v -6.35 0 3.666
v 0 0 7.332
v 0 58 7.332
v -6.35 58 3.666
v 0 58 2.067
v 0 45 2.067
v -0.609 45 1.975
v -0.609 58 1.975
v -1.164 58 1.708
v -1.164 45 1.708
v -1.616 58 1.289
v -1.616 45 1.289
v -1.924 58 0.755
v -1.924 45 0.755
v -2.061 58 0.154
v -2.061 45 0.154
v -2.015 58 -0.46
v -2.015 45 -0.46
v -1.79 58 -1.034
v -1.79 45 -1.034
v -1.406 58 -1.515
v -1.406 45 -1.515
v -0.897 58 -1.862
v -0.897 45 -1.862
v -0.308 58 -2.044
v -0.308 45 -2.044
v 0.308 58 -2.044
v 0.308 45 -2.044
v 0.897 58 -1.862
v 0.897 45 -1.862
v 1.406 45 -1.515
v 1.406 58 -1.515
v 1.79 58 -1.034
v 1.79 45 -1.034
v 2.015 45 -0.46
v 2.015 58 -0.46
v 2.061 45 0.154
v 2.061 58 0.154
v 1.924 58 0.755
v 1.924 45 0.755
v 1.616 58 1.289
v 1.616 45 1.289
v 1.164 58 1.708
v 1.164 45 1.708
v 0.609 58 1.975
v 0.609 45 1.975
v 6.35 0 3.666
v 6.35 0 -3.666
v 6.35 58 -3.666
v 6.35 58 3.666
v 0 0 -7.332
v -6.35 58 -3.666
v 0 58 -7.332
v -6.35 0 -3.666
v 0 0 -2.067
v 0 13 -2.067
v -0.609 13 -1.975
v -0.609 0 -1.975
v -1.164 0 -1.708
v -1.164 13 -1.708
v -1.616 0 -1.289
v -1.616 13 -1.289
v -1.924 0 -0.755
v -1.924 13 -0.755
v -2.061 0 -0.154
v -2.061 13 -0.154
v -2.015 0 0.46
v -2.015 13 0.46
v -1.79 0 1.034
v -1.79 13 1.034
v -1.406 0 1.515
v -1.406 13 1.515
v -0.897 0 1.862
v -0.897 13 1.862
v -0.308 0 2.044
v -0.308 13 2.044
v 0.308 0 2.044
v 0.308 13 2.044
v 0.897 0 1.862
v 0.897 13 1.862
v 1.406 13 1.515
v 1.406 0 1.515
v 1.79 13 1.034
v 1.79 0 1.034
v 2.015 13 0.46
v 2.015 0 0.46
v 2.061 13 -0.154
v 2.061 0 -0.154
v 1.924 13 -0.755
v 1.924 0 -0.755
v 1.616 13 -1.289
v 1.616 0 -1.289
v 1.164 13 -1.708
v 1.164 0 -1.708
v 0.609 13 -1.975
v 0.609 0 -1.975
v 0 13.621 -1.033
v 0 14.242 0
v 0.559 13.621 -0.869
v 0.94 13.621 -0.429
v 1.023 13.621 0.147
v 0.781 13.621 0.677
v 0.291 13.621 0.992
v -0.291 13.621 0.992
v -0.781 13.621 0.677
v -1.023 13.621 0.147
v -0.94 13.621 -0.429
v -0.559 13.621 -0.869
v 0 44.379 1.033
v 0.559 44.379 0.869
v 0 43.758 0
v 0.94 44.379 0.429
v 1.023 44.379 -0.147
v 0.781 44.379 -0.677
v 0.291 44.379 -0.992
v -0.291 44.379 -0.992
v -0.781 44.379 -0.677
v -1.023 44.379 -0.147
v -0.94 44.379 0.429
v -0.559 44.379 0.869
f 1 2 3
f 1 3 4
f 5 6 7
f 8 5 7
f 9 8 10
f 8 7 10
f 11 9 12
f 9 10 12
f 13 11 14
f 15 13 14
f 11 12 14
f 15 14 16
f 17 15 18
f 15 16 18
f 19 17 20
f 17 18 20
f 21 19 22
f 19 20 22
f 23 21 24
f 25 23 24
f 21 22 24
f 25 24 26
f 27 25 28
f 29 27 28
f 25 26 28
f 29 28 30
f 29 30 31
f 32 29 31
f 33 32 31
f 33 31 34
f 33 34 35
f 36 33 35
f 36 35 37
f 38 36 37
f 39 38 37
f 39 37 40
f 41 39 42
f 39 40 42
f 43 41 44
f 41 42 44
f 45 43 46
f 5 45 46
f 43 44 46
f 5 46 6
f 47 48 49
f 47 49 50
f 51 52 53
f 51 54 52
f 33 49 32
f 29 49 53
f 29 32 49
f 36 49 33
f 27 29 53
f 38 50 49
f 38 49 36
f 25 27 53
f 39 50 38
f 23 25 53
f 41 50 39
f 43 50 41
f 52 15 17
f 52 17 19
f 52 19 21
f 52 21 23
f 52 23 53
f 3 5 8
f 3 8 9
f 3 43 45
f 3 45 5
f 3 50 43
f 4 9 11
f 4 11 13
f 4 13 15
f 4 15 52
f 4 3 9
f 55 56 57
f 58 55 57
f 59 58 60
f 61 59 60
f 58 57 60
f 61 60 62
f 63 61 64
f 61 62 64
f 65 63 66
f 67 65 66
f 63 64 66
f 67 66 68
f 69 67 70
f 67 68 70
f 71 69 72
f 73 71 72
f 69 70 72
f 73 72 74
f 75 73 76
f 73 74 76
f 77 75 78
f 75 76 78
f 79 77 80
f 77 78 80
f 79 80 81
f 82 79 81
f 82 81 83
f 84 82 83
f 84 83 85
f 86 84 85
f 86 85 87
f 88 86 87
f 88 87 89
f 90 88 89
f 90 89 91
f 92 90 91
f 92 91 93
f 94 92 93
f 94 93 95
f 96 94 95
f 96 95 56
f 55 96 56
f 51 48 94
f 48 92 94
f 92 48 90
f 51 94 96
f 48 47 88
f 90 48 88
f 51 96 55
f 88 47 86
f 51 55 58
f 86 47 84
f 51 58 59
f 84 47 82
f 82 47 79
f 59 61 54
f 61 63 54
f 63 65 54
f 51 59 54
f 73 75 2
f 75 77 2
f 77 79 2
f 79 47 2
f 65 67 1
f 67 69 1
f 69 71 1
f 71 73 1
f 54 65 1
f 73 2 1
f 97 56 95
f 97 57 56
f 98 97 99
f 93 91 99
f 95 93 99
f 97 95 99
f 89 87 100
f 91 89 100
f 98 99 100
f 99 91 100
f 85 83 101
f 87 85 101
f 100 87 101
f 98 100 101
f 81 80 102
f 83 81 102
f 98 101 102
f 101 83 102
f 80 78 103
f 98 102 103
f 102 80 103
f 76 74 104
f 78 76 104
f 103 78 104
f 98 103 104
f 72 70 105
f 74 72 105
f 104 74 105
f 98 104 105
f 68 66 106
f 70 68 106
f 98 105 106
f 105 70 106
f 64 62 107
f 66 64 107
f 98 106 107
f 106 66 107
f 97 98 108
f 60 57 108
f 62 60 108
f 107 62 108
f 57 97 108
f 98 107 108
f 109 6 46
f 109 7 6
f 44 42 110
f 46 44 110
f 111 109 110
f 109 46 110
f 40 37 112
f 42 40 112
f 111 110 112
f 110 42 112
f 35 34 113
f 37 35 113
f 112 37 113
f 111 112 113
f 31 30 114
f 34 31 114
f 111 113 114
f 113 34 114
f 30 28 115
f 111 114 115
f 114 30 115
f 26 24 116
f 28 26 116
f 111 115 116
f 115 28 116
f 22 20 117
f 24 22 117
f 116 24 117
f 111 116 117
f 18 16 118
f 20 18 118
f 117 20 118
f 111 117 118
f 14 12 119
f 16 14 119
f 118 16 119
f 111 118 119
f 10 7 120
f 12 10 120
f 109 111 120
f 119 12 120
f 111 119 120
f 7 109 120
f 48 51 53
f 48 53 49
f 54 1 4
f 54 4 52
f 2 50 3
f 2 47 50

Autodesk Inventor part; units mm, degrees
ref_plane "YZ Plane" through (0, 0, 0) normal (1, 0, 0) x (0, 1, 0)
ref_plane "XZ Plane" through (0, 0, 0) normal (0, 1, 0) x (-1, 0, 0)
ref_plane "XY Plane" through (0, 0, 0) normal (0, 0, 1) x (1, 0, 0)
sketch "Sketch1" plane through (0, 0, 0) normal (0, 1, 0) x (-1, 0, 0)
  line L0 (0, 0) -> (6.35, 0)
  line L1 (6.35, -3.6662) -> (0, -7.3323)
  line L2 (0, -7.3323) -> (-6.35, -3.6662)
  line L3 (-6.35, -3.6662) -> (-6.35, 3.6662)
  line L4 (-6.35, 3.6662) -> (0, 7.3323)
  line L5 (0, 7.3323) -> (6.35, 3.6662)
  line L6 (6.35, 3.6662) -> (6.35, -3.6662)
  dimension "d0" = 6.35
extrude "Extrusion1" add sketch "Sketch1" along normal blind 58
sketch "Sketch3" plane through (0, 58, 0) normal (0, 1, 0) x (1, 0, 0)
  point P0 (0, 0)
  point P1 (0, 0)
hole "Hole1" at (0, 58, 0) direction (0, -1, 0) diameter 4.134 depth 13 tip angle 118 thread size "M5x0.8" class "6H" standard "ANSI Metric M Profile"
sketch "Sketch4" plane through (0, 0, 0) normal (0, -1, 0) x (1, 0, 0)
  point P0 (0, 0)
  point P1 (0, 0)
hole "Hole2" at (0, 0, 0) direction (0, 1, 0) diameter 4.134 depth 13 tip angle 118 thread size "M5x0.8" class "6H" standard "ANSI Metric M Profile"
properties part number "HexShaft"
